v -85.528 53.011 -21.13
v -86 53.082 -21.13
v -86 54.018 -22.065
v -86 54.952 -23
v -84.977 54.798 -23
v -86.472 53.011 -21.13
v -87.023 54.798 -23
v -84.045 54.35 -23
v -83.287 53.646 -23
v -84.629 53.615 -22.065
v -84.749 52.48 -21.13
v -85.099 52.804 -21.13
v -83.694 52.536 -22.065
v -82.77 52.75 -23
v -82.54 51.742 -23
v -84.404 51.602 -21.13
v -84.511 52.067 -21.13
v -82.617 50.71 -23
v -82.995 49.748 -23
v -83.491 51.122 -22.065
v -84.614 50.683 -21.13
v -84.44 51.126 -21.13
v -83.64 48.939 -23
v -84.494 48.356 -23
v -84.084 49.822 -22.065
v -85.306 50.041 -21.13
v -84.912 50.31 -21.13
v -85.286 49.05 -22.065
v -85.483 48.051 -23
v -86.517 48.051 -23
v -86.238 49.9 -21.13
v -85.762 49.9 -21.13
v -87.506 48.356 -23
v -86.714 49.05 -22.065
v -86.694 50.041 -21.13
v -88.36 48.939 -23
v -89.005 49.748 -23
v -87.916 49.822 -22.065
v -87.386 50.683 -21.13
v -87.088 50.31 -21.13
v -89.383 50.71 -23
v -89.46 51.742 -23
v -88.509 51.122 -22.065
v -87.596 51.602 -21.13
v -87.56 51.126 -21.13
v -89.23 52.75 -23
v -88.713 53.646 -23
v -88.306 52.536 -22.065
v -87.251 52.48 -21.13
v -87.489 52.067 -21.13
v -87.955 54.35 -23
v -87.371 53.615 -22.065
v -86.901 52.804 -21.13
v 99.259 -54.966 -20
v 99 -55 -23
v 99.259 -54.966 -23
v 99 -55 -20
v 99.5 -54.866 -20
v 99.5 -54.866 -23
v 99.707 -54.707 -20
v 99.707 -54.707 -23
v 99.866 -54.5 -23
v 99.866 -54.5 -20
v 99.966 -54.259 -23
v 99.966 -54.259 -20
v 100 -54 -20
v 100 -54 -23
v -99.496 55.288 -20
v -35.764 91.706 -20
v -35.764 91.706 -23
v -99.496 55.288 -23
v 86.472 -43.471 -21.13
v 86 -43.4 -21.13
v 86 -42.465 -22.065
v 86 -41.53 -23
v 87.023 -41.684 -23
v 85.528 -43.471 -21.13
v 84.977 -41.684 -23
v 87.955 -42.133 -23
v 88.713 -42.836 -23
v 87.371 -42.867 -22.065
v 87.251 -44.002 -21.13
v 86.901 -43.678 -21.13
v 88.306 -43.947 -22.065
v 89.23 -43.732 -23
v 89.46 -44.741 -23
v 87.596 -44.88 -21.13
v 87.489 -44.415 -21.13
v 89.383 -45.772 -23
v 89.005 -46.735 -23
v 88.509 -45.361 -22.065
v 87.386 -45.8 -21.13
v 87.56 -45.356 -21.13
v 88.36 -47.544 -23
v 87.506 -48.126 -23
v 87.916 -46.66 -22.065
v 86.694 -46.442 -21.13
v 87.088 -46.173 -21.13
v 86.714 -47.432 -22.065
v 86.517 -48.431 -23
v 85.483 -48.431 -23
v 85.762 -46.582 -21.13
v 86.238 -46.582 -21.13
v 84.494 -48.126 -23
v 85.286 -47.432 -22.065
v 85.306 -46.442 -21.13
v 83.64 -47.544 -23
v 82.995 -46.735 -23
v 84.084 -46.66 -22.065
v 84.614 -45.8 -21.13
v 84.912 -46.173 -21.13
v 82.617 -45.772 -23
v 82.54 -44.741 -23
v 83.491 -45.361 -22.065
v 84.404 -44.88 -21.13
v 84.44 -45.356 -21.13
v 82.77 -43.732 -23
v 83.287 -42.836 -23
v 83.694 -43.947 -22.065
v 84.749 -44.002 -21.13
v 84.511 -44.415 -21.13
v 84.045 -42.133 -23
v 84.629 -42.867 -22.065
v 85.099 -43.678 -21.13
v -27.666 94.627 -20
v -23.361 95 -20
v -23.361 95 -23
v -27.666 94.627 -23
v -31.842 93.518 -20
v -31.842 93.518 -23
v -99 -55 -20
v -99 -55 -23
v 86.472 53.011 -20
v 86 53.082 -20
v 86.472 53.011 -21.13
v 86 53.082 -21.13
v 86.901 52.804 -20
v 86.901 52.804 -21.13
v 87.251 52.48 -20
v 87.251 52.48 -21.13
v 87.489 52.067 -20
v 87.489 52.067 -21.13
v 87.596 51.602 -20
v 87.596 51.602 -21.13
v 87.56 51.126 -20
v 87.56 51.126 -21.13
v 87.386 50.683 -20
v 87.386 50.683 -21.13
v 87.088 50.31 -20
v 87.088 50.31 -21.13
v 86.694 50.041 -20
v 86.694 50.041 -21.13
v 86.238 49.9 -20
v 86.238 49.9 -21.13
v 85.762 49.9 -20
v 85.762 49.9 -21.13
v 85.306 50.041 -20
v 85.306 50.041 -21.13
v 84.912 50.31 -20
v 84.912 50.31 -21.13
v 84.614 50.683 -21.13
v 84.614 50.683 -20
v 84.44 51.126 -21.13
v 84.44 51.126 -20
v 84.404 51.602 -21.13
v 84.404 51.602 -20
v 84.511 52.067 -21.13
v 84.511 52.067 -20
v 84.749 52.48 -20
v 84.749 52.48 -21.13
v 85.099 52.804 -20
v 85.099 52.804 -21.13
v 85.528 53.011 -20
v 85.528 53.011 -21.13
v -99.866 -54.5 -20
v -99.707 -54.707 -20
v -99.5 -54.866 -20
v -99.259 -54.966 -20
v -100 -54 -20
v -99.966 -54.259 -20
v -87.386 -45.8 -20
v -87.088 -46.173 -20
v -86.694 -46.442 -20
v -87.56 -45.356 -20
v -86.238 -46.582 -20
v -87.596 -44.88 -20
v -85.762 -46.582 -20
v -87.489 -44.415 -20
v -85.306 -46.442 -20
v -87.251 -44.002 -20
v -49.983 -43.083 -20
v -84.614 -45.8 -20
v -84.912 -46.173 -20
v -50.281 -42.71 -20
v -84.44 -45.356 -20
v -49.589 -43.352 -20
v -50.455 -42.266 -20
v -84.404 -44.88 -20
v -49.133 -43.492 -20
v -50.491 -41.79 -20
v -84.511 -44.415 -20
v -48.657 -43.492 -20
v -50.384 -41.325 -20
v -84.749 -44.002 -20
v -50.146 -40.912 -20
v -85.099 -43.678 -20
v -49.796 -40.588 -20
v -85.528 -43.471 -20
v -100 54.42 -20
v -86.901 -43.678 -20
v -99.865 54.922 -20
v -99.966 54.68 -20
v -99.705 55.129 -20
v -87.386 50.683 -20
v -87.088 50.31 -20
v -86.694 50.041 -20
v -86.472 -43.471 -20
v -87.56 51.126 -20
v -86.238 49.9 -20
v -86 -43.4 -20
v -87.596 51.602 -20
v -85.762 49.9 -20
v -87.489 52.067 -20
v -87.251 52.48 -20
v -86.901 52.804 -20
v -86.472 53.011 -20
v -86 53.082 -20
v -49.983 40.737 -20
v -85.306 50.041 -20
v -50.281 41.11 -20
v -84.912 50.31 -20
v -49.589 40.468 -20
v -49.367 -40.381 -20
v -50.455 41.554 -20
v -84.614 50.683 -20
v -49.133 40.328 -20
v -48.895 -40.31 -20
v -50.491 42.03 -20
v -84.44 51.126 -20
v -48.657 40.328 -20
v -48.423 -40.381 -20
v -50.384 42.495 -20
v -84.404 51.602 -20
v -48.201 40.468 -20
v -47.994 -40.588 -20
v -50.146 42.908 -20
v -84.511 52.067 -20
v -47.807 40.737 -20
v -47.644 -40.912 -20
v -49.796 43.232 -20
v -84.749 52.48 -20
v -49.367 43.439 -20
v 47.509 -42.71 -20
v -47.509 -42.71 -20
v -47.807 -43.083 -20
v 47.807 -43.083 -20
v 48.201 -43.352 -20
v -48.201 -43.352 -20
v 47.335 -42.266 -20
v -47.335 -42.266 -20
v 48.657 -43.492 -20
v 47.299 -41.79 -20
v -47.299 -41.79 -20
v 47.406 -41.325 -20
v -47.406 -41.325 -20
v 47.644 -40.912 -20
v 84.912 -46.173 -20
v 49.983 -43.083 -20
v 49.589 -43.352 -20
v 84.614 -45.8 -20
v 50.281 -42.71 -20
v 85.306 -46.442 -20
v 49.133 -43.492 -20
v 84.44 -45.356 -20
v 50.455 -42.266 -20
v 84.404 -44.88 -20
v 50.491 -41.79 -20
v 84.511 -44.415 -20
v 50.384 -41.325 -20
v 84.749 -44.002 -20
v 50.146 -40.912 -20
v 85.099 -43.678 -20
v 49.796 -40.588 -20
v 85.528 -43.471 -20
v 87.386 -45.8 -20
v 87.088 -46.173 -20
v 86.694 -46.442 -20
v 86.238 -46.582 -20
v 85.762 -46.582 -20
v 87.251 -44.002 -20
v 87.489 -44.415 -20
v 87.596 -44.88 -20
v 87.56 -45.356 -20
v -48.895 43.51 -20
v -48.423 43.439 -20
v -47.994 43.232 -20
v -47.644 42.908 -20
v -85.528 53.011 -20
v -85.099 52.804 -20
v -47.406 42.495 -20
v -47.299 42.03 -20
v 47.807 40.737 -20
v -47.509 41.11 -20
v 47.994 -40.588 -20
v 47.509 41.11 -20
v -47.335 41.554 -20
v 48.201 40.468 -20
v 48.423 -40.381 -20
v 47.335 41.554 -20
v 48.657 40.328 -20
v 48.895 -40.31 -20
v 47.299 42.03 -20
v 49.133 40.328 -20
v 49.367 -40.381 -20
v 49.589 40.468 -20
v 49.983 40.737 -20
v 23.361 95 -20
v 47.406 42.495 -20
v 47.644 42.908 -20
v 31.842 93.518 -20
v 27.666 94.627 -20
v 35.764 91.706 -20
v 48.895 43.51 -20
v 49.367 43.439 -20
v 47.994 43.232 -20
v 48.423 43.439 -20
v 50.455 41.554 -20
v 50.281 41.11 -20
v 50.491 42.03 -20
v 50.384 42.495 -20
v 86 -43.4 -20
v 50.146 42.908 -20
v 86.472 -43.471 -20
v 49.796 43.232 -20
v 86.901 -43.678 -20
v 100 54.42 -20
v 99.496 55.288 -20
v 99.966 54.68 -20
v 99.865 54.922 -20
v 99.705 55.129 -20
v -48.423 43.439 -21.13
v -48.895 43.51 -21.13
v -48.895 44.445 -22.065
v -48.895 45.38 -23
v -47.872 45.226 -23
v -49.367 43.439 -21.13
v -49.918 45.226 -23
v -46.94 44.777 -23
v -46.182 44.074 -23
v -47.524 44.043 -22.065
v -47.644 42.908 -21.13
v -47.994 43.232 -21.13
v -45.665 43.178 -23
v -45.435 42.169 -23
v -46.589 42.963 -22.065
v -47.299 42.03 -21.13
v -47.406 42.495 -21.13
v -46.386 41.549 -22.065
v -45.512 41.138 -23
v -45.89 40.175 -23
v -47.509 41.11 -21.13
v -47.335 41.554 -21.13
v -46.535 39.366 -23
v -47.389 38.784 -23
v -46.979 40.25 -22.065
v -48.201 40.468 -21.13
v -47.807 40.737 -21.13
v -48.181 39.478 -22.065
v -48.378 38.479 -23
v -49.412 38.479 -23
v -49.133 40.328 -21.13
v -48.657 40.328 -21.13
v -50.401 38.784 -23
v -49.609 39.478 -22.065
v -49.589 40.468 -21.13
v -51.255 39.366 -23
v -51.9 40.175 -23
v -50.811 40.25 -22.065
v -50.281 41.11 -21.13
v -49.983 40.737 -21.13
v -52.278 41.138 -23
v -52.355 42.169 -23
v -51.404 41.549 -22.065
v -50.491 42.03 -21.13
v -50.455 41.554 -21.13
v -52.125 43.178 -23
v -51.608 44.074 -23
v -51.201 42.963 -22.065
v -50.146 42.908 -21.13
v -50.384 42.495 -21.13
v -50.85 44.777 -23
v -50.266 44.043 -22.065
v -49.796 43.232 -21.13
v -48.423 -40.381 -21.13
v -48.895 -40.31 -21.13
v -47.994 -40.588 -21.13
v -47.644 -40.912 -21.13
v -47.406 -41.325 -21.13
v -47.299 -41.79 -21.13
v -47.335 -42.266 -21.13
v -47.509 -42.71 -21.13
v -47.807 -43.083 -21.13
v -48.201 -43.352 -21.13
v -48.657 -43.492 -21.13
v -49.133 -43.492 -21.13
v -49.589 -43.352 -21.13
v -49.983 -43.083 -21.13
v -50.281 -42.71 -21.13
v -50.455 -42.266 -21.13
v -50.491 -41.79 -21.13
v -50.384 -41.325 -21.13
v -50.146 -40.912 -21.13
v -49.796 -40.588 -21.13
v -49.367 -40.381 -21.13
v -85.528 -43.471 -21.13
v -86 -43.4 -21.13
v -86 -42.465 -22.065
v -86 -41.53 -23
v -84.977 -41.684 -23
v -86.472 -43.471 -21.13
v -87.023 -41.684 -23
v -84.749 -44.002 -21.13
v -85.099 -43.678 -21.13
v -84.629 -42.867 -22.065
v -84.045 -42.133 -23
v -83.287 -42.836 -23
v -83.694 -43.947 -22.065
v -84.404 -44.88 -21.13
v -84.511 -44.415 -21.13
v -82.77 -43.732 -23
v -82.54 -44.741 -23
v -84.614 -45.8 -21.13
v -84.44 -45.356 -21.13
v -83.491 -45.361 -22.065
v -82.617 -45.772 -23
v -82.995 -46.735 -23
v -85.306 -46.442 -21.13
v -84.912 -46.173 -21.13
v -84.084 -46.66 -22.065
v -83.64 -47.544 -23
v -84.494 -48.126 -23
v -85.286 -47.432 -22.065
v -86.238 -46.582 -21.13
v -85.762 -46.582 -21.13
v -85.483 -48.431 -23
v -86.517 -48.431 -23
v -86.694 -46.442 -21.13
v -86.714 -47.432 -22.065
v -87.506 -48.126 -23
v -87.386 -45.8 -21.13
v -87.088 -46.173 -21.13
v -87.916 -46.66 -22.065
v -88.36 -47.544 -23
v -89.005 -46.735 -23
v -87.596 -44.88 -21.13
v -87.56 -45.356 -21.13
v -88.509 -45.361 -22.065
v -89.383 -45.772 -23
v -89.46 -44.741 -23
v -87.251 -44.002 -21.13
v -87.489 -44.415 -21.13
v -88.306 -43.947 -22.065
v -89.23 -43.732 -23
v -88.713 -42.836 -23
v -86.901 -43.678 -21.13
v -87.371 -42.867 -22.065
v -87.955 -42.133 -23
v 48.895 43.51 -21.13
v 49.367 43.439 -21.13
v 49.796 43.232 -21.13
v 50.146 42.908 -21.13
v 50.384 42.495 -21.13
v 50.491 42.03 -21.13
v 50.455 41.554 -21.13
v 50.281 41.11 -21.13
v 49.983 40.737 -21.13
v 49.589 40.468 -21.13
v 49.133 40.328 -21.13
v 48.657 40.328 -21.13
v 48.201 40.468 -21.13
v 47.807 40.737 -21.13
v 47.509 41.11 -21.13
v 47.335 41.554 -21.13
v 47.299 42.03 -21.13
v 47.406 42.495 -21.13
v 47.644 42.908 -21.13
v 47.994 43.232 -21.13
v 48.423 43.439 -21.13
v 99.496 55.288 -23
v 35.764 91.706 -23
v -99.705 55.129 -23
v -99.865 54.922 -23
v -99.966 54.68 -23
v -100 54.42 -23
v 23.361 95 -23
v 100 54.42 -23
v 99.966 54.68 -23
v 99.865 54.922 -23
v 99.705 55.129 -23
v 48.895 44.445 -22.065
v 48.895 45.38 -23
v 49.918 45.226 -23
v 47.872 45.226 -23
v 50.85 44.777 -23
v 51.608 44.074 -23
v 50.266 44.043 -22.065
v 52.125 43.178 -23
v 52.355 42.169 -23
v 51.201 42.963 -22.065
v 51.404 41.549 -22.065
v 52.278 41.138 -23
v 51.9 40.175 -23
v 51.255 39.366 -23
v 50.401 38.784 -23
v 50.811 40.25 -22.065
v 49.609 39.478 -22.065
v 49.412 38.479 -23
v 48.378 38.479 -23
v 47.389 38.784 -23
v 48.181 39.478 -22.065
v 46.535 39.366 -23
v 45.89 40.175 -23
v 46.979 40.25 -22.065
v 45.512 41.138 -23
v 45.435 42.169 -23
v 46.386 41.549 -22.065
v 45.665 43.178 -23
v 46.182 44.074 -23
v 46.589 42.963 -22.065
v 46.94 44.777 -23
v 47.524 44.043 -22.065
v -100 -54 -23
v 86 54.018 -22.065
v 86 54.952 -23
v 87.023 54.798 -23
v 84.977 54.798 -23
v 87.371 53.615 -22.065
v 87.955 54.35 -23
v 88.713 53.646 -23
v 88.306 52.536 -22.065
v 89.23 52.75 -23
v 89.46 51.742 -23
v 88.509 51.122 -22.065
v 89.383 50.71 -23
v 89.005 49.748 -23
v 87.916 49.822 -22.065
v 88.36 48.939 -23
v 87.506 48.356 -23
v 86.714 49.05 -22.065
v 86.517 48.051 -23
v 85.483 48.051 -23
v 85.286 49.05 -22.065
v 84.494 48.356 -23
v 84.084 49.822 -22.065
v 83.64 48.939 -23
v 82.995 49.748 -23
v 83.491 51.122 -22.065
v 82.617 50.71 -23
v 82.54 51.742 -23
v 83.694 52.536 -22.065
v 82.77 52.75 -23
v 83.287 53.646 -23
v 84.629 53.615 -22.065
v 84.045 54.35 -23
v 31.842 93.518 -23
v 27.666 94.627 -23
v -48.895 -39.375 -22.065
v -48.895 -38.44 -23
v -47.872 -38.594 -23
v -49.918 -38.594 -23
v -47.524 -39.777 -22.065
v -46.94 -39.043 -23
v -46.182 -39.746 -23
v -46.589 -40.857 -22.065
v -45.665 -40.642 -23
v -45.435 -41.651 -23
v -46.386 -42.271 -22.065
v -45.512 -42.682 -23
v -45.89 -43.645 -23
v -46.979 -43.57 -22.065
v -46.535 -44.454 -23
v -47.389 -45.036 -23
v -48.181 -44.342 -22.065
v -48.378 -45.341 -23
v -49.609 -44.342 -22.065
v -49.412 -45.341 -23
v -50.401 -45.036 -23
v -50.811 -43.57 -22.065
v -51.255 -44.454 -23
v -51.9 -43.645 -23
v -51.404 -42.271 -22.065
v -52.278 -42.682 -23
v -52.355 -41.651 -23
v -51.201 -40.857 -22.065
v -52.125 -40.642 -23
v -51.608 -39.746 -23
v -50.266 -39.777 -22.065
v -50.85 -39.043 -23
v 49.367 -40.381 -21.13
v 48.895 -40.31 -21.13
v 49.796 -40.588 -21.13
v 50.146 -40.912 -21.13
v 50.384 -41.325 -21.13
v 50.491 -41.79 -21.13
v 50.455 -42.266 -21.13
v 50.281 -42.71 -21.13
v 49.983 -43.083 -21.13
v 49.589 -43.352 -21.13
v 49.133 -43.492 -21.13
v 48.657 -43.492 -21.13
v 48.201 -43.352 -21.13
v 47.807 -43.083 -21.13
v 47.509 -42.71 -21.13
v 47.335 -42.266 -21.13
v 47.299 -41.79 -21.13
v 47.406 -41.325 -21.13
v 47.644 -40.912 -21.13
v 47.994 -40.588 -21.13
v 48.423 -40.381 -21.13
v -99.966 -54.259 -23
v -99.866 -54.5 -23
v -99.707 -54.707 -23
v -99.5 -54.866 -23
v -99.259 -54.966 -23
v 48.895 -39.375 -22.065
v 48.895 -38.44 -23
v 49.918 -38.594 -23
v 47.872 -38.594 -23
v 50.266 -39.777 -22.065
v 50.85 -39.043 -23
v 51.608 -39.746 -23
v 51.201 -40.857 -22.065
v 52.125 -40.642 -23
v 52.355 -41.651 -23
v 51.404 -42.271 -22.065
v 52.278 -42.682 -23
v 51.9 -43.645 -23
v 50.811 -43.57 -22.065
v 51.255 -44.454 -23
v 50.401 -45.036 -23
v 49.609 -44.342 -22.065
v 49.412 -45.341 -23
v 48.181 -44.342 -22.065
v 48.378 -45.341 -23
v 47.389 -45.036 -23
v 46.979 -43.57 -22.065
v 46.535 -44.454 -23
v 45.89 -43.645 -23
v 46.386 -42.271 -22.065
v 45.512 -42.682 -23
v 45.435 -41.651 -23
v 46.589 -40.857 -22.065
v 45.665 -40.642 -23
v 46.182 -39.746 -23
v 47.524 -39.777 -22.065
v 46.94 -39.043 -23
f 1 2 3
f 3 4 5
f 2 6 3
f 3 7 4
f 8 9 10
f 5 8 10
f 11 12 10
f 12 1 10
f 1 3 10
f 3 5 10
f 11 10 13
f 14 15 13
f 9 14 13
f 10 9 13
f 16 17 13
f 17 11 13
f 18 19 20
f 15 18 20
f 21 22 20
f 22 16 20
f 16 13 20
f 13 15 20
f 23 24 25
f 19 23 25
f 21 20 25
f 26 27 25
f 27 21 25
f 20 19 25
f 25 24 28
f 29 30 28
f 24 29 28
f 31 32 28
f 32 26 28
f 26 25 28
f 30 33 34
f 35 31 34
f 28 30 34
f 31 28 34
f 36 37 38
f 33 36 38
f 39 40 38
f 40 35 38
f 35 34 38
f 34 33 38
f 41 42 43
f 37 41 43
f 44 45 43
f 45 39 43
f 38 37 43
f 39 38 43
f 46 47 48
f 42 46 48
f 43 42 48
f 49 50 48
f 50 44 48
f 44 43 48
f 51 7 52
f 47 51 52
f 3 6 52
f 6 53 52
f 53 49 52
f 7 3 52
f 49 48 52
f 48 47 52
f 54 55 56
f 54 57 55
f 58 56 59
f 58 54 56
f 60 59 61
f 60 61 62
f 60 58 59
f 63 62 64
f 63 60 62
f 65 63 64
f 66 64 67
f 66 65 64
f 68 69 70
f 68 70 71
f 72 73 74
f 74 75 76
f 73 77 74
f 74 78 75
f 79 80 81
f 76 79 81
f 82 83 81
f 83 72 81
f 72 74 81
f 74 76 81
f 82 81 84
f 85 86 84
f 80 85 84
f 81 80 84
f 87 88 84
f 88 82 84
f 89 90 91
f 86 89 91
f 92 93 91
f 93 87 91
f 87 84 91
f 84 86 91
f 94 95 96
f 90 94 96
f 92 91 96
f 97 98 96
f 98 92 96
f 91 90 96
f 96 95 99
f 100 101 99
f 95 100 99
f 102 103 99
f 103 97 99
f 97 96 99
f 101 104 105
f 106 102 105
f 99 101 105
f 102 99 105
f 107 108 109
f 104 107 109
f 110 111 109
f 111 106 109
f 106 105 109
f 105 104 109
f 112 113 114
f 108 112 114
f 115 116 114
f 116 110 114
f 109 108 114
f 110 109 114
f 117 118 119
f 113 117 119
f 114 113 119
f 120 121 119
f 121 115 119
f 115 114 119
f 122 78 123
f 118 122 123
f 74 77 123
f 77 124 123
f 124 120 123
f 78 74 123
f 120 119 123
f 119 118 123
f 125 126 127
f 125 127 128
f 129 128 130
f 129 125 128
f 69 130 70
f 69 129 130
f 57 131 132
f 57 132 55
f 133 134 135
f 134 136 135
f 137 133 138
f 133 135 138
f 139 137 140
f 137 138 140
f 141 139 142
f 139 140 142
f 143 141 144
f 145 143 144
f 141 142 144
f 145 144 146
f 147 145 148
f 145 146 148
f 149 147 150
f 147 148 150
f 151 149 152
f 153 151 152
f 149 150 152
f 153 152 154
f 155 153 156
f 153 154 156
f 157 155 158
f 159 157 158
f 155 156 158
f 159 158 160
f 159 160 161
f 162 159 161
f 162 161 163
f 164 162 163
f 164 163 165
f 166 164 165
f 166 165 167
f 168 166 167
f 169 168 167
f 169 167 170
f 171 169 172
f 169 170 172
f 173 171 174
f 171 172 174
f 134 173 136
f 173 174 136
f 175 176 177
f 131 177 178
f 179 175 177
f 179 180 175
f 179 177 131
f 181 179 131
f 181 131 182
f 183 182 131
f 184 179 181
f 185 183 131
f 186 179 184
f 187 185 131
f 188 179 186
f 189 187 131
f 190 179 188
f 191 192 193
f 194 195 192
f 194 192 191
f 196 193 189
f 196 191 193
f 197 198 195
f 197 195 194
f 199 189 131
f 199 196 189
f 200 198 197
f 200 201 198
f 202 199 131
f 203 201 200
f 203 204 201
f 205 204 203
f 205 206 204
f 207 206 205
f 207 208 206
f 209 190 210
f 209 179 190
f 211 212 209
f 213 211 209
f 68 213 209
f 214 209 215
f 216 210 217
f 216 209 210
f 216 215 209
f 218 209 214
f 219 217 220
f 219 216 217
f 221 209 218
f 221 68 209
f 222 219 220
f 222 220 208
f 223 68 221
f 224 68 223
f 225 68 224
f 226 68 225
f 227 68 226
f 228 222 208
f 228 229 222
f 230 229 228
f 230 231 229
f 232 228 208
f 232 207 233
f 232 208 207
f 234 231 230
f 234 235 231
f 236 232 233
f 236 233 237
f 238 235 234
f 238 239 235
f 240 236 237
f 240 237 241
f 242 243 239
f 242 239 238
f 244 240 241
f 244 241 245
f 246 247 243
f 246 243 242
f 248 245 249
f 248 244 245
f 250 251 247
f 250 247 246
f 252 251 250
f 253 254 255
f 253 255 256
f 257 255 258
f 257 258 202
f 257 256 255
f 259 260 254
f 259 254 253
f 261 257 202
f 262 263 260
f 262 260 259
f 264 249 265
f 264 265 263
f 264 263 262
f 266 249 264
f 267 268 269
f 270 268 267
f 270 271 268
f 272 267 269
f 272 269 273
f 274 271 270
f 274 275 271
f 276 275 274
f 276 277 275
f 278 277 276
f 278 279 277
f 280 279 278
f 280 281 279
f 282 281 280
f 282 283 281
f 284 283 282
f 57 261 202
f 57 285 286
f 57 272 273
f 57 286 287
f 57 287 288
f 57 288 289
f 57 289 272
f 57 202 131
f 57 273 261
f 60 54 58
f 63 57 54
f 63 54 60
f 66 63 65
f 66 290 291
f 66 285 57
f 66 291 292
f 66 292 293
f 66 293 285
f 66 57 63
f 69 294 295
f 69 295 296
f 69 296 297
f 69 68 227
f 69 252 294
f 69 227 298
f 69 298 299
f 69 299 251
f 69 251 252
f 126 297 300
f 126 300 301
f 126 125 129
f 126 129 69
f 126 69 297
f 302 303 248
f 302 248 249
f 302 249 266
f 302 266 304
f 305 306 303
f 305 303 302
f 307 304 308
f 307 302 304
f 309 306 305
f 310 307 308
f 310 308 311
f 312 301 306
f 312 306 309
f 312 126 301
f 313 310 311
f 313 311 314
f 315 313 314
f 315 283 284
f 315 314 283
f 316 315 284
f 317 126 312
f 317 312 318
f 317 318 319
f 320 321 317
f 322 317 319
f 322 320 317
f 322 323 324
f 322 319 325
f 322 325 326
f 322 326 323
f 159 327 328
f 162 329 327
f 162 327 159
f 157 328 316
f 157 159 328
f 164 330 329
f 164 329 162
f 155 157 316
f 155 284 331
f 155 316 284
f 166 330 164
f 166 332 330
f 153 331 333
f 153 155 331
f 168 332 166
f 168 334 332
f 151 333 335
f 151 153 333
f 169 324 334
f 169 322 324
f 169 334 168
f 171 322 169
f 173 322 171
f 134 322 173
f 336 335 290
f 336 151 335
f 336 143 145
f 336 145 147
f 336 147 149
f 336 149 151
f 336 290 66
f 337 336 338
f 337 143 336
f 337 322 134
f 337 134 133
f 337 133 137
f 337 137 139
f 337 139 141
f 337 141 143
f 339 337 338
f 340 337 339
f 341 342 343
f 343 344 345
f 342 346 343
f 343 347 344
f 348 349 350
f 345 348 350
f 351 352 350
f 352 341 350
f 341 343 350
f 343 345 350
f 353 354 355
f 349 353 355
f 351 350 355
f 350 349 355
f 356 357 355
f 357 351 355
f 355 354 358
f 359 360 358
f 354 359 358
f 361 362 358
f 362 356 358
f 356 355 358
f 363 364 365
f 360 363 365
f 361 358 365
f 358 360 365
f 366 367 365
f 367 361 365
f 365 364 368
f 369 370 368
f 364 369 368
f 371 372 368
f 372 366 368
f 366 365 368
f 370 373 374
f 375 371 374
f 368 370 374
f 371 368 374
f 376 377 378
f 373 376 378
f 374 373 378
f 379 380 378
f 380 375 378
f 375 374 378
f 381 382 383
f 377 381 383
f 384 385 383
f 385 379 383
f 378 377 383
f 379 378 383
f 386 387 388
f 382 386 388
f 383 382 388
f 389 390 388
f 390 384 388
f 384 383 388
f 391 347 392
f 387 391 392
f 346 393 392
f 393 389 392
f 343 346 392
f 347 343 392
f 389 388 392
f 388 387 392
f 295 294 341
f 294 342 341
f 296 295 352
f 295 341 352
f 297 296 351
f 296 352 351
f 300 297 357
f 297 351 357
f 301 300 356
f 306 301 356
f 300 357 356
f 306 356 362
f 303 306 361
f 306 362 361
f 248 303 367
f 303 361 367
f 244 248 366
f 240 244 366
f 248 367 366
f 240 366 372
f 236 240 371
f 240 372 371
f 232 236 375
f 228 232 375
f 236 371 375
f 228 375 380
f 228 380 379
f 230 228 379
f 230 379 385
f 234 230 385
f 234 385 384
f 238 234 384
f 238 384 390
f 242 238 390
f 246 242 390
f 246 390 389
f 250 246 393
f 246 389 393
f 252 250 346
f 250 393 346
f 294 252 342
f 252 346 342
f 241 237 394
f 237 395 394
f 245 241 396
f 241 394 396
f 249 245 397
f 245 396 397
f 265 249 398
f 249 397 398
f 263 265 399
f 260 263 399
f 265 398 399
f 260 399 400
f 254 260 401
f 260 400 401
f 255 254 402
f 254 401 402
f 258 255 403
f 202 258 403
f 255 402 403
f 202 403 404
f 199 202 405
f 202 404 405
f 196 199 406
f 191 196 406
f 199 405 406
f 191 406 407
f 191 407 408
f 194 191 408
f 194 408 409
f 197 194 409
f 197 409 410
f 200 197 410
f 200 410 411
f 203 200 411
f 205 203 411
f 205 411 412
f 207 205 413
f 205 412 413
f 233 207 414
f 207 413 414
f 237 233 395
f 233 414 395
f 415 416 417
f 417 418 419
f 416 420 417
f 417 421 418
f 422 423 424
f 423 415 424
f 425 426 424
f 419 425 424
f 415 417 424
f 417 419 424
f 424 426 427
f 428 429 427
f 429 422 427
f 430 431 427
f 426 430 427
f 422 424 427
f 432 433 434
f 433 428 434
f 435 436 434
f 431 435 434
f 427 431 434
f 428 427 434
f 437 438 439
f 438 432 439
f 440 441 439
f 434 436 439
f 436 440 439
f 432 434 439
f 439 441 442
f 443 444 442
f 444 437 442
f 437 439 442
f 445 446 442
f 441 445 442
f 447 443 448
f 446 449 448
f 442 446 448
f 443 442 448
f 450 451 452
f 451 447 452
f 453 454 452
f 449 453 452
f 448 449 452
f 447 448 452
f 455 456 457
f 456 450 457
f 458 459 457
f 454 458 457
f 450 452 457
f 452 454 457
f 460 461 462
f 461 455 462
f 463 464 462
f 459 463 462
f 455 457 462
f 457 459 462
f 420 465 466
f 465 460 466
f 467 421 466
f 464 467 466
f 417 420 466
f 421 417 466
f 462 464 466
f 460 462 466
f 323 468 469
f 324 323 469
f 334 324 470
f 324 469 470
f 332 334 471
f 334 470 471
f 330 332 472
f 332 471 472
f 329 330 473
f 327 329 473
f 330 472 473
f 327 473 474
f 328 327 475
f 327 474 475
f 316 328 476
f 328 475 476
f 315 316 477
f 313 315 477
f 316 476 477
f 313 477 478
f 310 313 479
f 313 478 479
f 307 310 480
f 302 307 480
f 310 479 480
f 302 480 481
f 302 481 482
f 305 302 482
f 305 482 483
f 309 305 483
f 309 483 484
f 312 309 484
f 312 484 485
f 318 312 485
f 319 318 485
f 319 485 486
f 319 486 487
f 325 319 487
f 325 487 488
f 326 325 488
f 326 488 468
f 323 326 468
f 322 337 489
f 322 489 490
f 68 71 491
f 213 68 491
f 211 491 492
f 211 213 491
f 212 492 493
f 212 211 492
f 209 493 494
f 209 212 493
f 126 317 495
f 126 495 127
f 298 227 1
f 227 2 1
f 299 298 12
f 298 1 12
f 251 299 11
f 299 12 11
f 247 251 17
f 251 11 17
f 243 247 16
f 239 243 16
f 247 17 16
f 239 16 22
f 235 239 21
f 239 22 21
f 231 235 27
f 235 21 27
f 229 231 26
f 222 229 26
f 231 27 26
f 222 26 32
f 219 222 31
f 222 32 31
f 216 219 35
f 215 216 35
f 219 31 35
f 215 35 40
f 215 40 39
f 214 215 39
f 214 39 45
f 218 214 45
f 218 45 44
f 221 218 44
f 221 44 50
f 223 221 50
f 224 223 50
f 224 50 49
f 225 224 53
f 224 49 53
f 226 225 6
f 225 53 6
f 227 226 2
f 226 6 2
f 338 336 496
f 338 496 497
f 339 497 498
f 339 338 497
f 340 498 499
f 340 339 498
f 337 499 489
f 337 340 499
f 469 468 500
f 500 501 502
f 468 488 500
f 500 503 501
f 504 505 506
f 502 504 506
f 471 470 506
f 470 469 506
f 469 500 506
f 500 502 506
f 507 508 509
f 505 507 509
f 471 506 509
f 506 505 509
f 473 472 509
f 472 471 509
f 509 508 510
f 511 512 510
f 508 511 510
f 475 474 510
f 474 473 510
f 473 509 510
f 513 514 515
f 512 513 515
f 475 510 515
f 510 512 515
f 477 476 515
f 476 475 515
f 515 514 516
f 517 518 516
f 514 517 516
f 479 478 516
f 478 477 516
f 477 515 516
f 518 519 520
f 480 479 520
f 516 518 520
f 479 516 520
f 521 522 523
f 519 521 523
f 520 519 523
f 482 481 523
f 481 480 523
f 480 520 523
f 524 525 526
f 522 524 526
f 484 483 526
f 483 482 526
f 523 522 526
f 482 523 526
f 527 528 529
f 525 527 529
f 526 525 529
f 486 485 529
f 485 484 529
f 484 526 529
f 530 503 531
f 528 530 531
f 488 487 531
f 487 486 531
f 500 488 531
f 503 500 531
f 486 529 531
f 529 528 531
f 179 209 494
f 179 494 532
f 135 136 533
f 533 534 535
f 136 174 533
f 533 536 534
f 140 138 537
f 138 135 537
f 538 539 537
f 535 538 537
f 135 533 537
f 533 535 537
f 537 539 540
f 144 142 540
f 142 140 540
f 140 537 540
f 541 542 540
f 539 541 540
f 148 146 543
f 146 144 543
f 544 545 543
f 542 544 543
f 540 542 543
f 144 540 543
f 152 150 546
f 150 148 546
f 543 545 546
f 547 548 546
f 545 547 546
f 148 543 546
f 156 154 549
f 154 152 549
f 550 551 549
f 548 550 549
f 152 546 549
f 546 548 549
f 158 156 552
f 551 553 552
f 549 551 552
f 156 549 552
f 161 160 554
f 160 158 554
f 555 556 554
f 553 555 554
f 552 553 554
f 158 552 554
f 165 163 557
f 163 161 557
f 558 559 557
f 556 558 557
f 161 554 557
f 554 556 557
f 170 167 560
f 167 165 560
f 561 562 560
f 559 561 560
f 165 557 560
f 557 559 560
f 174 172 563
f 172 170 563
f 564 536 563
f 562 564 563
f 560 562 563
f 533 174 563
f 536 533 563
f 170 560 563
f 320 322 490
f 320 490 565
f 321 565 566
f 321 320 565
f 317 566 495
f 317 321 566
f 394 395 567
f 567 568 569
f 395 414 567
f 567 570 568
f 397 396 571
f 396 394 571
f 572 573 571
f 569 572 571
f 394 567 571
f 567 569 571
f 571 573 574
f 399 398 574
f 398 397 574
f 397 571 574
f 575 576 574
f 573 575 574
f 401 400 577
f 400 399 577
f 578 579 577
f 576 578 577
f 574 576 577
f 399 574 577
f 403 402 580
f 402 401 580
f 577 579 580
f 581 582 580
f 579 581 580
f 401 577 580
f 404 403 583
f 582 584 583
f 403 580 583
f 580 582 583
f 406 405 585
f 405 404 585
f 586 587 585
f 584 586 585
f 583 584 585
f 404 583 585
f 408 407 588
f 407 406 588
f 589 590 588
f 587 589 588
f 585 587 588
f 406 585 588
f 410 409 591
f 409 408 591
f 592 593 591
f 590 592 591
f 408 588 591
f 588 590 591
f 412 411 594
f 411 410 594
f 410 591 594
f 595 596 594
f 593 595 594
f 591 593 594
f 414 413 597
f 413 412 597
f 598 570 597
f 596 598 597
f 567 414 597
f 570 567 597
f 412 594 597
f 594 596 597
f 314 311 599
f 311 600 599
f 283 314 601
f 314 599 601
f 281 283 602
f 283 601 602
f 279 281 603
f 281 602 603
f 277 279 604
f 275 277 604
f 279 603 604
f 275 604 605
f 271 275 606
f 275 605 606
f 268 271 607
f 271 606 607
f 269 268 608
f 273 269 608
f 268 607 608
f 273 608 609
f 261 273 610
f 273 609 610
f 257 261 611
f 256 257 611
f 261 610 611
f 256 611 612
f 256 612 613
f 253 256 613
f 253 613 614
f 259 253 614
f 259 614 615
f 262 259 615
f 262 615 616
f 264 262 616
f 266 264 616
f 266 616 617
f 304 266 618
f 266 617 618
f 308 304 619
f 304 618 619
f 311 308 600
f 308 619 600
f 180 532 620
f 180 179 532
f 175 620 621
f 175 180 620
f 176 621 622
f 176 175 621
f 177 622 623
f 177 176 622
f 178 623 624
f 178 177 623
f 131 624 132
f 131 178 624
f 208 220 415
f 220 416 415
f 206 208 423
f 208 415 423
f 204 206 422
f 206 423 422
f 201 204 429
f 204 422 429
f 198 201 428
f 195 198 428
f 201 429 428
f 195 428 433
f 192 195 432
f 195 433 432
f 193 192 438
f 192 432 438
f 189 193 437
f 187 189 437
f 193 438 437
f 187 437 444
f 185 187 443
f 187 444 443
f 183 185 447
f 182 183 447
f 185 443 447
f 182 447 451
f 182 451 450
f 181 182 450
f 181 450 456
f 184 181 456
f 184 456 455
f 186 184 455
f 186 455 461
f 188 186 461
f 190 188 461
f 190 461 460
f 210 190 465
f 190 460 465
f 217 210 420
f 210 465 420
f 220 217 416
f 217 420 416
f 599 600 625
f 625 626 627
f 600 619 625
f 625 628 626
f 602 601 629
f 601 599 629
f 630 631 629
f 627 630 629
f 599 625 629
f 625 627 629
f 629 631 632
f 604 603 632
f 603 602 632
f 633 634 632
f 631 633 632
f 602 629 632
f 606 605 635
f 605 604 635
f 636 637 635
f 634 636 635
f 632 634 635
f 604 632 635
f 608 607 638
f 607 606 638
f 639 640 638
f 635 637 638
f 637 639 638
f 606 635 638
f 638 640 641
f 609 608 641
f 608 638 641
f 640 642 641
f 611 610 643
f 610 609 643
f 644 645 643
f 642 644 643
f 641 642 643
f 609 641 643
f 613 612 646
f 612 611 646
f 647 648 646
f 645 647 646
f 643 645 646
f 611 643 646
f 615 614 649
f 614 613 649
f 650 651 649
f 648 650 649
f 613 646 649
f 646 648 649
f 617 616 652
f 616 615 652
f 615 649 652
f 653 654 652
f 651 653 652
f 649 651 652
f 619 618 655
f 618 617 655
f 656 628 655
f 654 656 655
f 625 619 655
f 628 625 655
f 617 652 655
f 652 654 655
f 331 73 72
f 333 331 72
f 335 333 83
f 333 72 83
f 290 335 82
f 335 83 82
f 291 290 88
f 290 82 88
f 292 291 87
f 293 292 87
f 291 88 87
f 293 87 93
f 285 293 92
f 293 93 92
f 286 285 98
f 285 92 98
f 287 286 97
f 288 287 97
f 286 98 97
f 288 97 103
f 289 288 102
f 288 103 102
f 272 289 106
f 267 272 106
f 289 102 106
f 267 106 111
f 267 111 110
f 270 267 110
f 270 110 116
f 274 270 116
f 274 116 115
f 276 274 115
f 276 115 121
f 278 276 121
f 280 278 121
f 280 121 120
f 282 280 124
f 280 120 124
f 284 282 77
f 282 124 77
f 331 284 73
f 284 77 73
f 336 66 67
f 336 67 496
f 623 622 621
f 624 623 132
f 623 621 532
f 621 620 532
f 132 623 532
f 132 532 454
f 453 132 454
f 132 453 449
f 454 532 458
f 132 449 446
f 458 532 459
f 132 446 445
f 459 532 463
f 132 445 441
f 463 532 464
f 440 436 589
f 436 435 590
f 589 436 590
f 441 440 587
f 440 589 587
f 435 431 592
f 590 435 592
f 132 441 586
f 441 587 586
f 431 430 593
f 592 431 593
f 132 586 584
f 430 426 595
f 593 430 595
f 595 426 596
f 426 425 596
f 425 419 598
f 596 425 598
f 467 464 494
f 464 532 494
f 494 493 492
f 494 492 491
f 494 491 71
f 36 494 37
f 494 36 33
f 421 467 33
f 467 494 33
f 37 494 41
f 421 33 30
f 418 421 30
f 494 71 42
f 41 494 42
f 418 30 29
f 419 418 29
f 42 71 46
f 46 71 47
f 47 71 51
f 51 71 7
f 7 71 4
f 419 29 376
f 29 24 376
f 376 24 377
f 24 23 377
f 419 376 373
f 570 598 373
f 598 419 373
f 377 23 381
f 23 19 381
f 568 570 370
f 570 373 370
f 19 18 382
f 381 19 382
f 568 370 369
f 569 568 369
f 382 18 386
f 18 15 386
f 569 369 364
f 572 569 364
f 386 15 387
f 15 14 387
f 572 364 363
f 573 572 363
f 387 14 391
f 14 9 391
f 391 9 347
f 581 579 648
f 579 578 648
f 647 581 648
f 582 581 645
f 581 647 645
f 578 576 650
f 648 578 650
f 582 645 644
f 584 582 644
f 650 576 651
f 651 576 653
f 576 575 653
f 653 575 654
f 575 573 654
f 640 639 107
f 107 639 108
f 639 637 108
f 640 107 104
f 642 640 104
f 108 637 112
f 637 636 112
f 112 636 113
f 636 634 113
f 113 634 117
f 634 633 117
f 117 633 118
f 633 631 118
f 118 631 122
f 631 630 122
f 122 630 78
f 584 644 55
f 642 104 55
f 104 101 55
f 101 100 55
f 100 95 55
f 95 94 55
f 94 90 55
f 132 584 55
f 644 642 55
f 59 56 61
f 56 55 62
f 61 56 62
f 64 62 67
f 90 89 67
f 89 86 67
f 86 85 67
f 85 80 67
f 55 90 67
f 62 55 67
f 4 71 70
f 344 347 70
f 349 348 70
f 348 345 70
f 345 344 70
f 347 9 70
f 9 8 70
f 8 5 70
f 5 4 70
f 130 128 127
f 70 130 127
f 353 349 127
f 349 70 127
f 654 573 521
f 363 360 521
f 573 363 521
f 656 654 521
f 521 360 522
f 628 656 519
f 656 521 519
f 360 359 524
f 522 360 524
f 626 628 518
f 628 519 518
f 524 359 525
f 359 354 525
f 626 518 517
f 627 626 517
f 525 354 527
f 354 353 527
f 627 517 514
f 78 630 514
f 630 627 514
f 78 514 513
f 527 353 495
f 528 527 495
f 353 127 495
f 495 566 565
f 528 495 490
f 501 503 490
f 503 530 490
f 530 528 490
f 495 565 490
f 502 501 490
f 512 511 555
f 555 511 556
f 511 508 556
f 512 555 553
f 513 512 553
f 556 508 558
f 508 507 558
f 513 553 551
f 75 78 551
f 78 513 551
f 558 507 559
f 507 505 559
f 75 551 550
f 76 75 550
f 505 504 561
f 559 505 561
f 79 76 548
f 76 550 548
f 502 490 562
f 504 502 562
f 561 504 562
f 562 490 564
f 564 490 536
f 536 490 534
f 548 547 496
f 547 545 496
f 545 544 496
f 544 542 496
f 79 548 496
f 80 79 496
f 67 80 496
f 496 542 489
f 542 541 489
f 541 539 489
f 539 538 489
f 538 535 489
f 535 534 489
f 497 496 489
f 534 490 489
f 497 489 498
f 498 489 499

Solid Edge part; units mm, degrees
sketch "Sketch1" plane through (0, 0, -20) normal (0, 0, -1) x (-1, 0, 0)
  line L0 (-99.4961, 55.2879) -> (-35.7644, 91.7061)
  arc A0 (-35.7644, 91.7061) -> (-23.3609, 95) centre (-23.3609, 70) cw
  line L1 (-23.3609, 95) -> (-19.45, 95)
  line L2 (-19.45, 95) -> (-13.95, 95)
  line L3 (-13.95, 95) -> (23.3609, 95)
  arc A1 (23.3609, 95) -> (35.7644, 91.7061) centre (23.3609, 70) cw
  line L4 (35.7644, 91.7061) -> (99.4961, 55.2879)
  arc A2 (99.4961, 55.2879) -> (100, 54.4197) centre (99, 54.4197) cw
  line L5 (100, 54.4197) -> (100, -54)
  arc A3 (100, -54) -> (99, -55) centre (99, -54) cw
  line L6 (99, -55) -> (-99, -55)
  arc A4 (-99, -55) -> (-100, -54) centre (-99, -54) cw
  line L7 (-100, -54) -> (-100, 54.4197)
  arc A5 (-100, 54.4197) -> (-99.4961, 55.2879) centre (-99, 54.4197) cw
extrude "Extrusionsausprägung_1" add sketch "Sketch1" along normal blind 3
hole "Bohrung_1" at (86, 51.4825, -23) direction (0, 0, 1) diameter 3.2 end through all countersink diameter 6.94 countersink angle 90
hole "Hole1" at (86, -45, -23) direction (0, 0, 1) diameter 3.2 end through all countersink diameter 6.94 countersink angle 90
hole "Hole2" at (-86, 51.4825, -23) direction (0, 0, 1) diameter 3.2 end through all countersink diameter 6.94 countersink angle 90
hole "Hole3" at (-86, -45, -23) direction (0, 0, 1) diameter 3.2 end through all countersink diameter 6.94 countersink angle 90
hole "Hole4" at (48.895, 41.91, -23) direction (0, 0, 1) diameter 3.2 end through all countersink diameter 6.94 countersink angle 90
hole "Hole5" at (-48.895, 41.91, -23) direction (0, 0, 1) diameter 3.2 end through all countersink diameter 6.94 countersink angle 90
hole "Hole6" at (-48.895, -41.91, -23) direction (0, 0, 1) diameter 3.2 end through all countersink diameter 6.94 countersink angle 90
hole "Hole7" at (48.895, -41.91, -23) direction (0, 0, 1) diameter 3.2 end through all countersink diameter 6.94 countersink angle 90
